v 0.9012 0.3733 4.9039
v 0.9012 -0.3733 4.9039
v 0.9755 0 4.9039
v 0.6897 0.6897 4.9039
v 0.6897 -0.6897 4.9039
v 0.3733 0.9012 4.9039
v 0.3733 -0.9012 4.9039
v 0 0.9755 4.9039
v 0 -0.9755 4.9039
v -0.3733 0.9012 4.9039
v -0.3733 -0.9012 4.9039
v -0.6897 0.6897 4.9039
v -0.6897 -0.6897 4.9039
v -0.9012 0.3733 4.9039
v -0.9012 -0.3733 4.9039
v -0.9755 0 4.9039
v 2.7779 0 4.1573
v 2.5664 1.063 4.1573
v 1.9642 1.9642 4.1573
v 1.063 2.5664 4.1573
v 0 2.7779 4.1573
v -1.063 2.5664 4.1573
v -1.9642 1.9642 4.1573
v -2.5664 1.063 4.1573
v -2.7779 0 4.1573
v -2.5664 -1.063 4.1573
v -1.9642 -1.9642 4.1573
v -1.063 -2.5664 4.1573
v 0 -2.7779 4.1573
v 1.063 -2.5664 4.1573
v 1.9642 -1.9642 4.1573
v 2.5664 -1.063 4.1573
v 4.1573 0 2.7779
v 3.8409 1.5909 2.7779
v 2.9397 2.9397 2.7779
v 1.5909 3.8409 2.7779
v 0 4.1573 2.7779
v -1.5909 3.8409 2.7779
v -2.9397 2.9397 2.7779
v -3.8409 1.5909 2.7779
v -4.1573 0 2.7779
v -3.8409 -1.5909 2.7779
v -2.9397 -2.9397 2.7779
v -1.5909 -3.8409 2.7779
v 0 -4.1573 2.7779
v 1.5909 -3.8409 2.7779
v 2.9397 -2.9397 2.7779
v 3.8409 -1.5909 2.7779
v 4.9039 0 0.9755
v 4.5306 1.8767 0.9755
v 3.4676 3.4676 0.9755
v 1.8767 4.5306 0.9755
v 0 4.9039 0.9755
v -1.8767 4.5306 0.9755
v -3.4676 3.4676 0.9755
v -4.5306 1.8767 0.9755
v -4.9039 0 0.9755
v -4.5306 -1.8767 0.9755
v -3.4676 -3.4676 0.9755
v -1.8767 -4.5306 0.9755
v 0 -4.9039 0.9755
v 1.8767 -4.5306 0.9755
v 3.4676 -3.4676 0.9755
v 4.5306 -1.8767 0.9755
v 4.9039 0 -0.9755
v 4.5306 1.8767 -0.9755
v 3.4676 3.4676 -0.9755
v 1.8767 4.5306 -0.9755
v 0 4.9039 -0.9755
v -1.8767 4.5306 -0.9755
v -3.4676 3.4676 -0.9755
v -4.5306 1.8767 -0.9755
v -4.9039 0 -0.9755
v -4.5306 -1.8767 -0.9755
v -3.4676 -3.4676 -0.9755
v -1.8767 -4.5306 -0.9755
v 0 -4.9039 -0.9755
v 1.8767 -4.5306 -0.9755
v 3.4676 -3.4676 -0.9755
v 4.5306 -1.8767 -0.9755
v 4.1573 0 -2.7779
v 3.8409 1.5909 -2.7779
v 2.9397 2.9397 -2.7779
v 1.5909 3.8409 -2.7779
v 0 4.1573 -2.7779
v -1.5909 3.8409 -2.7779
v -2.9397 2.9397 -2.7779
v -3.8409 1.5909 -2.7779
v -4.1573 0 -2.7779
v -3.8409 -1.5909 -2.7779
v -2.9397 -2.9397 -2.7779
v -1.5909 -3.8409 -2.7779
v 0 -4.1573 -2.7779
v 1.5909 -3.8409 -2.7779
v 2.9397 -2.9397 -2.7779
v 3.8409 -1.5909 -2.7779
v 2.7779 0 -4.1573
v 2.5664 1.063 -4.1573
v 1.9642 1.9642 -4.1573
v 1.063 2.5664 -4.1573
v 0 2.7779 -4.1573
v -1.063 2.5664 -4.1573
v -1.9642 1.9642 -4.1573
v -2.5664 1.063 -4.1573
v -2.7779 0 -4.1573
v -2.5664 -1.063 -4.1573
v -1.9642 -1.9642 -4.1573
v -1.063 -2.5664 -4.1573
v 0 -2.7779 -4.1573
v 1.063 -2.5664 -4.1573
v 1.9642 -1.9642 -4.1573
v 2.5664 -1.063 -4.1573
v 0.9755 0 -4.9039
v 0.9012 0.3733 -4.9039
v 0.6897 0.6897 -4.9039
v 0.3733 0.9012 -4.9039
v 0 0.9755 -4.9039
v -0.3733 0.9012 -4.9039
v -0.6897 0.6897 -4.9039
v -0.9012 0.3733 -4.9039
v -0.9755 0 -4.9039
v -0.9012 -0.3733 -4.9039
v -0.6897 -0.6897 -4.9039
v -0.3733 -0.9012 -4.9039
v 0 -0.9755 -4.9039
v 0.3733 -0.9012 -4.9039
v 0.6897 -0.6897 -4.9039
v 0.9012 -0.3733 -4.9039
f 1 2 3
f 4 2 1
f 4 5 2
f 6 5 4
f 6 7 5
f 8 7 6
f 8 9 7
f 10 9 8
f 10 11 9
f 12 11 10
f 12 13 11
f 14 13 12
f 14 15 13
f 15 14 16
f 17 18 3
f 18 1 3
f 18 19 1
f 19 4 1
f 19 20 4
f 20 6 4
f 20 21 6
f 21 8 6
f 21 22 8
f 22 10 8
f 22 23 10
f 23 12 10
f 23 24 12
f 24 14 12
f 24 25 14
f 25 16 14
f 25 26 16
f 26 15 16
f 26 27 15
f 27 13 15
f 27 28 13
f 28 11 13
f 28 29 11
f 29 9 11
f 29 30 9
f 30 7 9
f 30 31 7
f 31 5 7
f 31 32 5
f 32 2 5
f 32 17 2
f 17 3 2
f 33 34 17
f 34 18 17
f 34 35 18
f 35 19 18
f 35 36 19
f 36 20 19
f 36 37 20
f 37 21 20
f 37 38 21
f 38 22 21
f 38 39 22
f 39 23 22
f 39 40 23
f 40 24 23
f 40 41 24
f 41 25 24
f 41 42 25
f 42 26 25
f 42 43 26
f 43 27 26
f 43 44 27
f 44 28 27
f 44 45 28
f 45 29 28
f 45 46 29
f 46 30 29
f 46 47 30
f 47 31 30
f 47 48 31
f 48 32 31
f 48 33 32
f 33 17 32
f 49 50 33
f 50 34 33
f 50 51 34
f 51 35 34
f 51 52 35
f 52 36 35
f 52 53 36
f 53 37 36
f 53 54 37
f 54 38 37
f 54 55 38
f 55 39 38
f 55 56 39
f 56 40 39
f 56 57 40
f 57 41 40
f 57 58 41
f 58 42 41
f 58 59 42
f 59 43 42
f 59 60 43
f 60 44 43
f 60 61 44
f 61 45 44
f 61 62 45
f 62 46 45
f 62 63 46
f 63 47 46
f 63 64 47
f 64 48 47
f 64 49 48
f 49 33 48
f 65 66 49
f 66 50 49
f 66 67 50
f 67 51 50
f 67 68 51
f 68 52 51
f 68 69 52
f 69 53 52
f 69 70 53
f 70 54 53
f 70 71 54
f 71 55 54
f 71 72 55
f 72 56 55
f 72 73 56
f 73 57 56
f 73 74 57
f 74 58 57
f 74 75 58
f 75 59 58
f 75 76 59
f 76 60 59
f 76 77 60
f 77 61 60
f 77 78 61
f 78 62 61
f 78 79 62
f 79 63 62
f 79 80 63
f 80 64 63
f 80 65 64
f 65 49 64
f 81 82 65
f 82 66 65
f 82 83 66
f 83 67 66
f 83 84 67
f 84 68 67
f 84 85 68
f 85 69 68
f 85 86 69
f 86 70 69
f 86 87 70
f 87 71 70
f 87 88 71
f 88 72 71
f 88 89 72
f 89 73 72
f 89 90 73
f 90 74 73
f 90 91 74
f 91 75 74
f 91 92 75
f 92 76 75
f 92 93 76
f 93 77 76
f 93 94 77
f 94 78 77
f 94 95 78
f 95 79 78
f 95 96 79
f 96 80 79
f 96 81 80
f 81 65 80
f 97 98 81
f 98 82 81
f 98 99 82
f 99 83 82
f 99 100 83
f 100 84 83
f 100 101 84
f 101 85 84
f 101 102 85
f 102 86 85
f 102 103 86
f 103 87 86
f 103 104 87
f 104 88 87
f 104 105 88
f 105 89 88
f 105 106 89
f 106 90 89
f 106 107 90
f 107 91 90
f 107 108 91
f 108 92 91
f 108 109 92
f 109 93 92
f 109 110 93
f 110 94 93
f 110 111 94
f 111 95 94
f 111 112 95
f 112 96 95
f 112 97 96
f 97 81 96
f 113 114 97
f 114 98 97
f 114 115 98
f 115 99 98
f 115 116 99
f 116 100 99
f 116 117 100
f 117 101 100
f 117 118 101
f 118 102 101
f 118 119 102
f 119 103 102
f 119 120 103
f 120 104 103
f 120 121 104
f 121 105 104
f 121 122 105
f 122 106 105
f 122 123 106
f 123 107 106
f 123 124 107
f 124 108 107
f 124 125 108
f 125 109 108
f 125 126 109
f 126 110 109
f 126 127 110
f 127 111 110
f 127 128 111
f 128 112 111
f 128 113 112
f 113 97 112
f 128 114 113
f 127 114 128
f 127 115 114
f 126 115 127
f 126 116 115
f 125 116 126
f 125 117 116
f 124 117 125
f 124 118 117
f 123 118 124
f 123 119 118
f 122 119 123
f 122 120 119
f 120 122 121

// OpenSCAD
//Spehrical to rectangular coordinate converter (r,theta,zenit)
function spher_rect(r,theta,zenit) = 
[ r*(sin(theta)*cos(zenit)) , r*(sin(theta)*sin(zenit)), r*cos(theta) ];

rad = 50;
the= 180*$t;
rot= 360*3*cos(180*$t);

steps=floor(200*$t);

for(i=[0:steps]) {
 translate(spher_rect(rad,the*(i/steps),rot*(i/steps))) sphere(r=5);
}
